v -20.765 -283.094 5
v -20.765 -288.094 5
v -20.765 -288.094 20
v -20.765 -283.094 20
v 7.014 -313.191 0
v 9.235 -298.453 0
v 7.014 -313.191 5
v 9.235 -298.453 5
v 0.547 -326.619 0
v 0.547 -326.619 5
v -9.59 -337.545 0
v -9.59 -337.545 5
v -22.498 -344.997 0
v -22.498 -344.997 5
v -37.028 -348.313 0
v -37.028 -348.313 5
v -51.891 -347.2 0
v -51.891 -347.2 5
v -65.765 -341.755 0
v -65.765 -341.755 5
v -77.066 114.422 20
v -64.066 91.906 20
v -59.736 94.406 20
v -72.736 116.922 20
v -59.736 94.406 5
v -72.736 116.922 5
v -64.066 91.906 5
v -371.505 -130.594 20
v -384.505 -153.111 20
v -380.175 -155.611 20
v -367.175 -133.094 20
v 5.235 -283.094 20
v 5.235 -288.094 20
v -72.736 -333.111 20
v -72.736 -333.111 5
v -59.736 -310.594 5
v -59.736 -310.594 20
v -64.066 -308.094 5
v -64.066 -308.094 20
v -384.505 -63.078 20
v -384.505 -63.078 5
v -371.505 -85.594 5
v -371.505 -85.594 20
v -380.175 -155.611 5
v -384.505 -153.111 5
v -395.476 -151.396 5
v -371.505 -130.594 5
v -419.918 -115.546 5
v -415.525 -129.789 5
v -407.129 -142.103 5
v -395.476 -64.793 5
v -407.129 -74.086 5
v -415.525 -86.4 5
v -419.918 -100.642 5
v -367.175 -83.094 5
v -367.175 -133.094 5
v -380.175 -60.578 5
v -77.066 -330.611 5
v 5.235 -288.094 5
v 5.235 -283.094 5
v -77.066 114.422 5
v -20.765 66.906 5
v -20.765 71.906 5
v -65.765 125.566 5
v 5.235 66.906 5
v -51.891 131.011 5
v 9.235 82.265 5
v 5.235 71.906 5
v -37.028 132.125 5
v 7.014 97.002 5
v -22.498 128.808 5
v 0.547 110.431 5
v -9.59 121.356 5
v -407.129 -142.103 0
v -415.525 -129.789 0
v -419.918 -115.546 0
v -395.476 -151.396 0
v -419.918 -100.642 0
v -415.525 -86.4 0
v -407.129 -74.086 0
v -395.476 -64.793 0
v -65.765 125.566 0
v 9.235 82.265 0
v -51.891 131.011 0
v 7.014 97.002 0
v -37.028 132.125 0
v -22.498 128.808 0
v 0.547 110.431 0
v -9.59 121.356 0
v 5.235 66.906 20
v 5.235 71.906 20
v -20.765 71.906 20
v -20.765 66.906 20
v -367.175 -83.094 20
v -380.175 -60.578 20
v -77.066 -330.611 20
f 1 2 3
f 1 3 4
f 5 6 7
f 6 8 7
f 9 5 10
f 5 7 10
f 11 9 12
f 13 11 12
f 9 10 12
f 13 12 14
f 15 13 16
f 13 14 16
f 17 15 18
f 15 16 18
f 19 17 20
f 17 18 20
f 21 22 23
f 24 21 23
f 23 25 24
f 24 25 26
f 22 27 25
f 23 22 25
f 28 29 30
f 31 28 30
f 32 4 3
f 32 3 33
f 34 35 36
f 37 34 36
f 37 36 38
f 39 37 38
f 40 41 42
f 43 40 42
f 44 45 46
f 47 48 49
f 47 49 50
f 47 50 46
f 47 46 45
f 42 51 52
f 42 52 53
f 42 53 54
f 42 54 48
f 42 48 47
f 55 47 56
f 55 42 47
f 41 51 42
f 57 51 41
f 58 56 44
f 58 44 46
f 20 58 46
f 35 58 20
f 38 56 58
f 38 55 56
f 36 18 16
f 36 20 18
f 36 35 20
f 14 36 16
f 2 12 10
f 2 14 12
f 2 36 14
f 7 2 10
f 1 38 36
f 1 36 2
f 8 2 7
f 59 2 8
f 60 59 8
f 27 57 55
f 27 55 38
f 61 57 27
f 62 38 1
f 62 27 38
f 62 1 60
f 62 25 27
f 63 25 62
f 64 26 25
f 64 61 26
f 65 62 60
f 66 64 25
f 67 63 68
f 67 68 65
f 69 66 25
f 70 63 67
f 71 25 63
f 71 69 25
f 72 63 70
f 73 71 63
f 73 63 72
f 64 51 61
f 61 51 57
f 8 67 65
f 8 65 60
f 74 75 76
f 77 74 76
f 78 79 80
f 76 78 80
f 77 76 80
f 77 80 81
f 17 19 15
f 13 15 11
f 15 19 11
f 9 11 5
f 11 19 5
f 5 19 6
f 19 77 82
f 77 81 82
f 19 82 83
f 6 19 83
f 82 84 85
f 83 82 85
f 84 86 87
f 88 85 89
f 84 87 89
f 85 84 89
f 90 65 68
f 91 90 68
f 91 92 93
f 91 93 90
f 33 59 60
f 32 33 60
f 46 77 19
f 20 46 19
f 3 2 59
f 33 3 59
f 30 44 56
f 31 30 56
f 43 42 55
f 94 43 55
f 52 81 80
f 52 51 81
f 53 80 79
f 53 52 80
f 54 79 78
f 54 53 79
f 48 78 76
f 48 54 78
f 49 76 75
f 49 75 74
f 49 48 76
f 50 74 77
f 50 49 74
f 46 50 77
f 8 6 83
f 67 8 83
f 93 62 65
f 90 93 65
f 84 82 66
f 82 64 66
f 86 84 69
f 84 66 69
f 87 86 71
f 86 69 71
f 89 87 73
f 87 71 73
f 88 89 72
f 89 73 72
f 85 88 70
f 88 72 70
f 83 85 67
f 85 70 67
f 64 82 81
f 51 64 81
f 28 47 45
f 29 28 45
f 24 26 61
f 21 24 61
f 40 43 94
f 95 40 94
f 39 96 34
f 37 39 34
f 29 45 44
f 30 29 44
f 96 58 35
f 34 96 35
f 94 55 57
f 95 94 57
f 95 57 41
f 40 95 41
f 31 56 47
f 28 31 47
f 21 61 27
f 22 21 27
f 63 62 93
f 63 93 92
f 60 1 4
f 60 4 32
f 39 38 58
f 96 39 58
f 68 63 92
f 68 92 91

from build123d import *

# Parameters (mm, degrees)
SKETCH1_W           = 26
SKETCH1_H           = 5
BOSS_EXTRUDE1_DEPTH = 5
FILLET1_R           = 50
SKETCH1_5_W         = 26
SKETCH1_5_H         = 5
BOSS_EXTRUDE2_DEPTH = 20


with BuildPart() as part:
    # Sketch1 → Boss-Extrude1 (new body)
    with BuildSketch(Plane.XY):
        Polygon((9.235124147, 168.867198813), (-470.476307556, -108.094325414), (9.235124147, -385.055849641), align=None)
        with Locations((-7.764875853, -285.594325414)):
            Rectangle(SKETCH1_W, SKETCH1_H, mode=Mode.SUBTRACT)
        Polygon((-64.066146043, -308.094325414), (-59.736019024, -310.594325414), (-72.736019024, -333.110985912), (-77.066146043, -330.610985912), align=None, mode=Mode.SUBTRACT)
        Polygon((-371.505164386, -130.594325414), (-367.175037367, -133.094325414), (-380.175037367, -155.610985912), (-384.505164386, -153.110985912), align=None, mode=Mode.SUBTRACT)
        Polygon((-367.175037367, -83.094325414), (-371.505164386, -85.594325414), (-384.505164386, -63.077664915), (-380.175037367, -60.577664915), align=None, mode=Mode.SUBTRACT)
        Polygon((-59.736019024, 94.405674586), (-64.066146043, 91.905674586), (-77.066146043, 114.422335085), (-72.736019024, 116.922335085), align=None, mode=Mode.SUBTRACT)
        with Locations((-7.764875853, 69.405674586)):
            Rectangle(SKETCH1_W, SKETCH1_H, mode=Mode.SUBTRACT)
    extrude(amount=BOSS_EXTRUDE1_DEPTH)

    # Fillet1
    fillet1_edges = [part.edges().sort_by_distance(p)[0] for p in [
        (-470.476307556, -108.094325414, 2.5),
        (9.235124147, 168.867198813, 2.5),
        (9.235124147, -385.055849641, 2.5),
    ]]
    fillet(fillet1_edges, radius=FILLET1_R)

    # Sketch1<5> → Boss-Extrude2 (add)
    with BuildSketch(Plane.XY):
        with Locations((-7.764875853, 69.405674586)):
            Rectangle(SKETCH1_5_W, SKETCH1_5_H)
        Polygon((-64.066146043, 91.905674586), (-59.736019024, 94.405674586), (-72.736019024, 116.922335085), (-77.066146043, 114.422335085), align=None)
        Polygon((-371.505164386, -85.594325414), (-367.175037367, -83.094325414), (-380.175037367, -60.577664915), (-384.505164386, -63.077664915), align=None)
        Polygon((-380.175037367, -155.610985912), (-367.175037367, -133.094325414), (-371.505164386, -130.594325414), (-384.505164386, -153.110985912), align=None)
        Polygon((-72.736019024, -333.110985912), (-59.736019024, -310.594325414), (-64.066146043, -308.094325414), (-77.066146043, -330.610985912), align=None)
        with Locations((-7.764875853, -285.594325414)):
            Rectangle(SKETCH1_5_W, SKETCH1_5_H)
    extrude(amount=BOSS_EXTRUDE2_DEPTH)


solid = part.part
